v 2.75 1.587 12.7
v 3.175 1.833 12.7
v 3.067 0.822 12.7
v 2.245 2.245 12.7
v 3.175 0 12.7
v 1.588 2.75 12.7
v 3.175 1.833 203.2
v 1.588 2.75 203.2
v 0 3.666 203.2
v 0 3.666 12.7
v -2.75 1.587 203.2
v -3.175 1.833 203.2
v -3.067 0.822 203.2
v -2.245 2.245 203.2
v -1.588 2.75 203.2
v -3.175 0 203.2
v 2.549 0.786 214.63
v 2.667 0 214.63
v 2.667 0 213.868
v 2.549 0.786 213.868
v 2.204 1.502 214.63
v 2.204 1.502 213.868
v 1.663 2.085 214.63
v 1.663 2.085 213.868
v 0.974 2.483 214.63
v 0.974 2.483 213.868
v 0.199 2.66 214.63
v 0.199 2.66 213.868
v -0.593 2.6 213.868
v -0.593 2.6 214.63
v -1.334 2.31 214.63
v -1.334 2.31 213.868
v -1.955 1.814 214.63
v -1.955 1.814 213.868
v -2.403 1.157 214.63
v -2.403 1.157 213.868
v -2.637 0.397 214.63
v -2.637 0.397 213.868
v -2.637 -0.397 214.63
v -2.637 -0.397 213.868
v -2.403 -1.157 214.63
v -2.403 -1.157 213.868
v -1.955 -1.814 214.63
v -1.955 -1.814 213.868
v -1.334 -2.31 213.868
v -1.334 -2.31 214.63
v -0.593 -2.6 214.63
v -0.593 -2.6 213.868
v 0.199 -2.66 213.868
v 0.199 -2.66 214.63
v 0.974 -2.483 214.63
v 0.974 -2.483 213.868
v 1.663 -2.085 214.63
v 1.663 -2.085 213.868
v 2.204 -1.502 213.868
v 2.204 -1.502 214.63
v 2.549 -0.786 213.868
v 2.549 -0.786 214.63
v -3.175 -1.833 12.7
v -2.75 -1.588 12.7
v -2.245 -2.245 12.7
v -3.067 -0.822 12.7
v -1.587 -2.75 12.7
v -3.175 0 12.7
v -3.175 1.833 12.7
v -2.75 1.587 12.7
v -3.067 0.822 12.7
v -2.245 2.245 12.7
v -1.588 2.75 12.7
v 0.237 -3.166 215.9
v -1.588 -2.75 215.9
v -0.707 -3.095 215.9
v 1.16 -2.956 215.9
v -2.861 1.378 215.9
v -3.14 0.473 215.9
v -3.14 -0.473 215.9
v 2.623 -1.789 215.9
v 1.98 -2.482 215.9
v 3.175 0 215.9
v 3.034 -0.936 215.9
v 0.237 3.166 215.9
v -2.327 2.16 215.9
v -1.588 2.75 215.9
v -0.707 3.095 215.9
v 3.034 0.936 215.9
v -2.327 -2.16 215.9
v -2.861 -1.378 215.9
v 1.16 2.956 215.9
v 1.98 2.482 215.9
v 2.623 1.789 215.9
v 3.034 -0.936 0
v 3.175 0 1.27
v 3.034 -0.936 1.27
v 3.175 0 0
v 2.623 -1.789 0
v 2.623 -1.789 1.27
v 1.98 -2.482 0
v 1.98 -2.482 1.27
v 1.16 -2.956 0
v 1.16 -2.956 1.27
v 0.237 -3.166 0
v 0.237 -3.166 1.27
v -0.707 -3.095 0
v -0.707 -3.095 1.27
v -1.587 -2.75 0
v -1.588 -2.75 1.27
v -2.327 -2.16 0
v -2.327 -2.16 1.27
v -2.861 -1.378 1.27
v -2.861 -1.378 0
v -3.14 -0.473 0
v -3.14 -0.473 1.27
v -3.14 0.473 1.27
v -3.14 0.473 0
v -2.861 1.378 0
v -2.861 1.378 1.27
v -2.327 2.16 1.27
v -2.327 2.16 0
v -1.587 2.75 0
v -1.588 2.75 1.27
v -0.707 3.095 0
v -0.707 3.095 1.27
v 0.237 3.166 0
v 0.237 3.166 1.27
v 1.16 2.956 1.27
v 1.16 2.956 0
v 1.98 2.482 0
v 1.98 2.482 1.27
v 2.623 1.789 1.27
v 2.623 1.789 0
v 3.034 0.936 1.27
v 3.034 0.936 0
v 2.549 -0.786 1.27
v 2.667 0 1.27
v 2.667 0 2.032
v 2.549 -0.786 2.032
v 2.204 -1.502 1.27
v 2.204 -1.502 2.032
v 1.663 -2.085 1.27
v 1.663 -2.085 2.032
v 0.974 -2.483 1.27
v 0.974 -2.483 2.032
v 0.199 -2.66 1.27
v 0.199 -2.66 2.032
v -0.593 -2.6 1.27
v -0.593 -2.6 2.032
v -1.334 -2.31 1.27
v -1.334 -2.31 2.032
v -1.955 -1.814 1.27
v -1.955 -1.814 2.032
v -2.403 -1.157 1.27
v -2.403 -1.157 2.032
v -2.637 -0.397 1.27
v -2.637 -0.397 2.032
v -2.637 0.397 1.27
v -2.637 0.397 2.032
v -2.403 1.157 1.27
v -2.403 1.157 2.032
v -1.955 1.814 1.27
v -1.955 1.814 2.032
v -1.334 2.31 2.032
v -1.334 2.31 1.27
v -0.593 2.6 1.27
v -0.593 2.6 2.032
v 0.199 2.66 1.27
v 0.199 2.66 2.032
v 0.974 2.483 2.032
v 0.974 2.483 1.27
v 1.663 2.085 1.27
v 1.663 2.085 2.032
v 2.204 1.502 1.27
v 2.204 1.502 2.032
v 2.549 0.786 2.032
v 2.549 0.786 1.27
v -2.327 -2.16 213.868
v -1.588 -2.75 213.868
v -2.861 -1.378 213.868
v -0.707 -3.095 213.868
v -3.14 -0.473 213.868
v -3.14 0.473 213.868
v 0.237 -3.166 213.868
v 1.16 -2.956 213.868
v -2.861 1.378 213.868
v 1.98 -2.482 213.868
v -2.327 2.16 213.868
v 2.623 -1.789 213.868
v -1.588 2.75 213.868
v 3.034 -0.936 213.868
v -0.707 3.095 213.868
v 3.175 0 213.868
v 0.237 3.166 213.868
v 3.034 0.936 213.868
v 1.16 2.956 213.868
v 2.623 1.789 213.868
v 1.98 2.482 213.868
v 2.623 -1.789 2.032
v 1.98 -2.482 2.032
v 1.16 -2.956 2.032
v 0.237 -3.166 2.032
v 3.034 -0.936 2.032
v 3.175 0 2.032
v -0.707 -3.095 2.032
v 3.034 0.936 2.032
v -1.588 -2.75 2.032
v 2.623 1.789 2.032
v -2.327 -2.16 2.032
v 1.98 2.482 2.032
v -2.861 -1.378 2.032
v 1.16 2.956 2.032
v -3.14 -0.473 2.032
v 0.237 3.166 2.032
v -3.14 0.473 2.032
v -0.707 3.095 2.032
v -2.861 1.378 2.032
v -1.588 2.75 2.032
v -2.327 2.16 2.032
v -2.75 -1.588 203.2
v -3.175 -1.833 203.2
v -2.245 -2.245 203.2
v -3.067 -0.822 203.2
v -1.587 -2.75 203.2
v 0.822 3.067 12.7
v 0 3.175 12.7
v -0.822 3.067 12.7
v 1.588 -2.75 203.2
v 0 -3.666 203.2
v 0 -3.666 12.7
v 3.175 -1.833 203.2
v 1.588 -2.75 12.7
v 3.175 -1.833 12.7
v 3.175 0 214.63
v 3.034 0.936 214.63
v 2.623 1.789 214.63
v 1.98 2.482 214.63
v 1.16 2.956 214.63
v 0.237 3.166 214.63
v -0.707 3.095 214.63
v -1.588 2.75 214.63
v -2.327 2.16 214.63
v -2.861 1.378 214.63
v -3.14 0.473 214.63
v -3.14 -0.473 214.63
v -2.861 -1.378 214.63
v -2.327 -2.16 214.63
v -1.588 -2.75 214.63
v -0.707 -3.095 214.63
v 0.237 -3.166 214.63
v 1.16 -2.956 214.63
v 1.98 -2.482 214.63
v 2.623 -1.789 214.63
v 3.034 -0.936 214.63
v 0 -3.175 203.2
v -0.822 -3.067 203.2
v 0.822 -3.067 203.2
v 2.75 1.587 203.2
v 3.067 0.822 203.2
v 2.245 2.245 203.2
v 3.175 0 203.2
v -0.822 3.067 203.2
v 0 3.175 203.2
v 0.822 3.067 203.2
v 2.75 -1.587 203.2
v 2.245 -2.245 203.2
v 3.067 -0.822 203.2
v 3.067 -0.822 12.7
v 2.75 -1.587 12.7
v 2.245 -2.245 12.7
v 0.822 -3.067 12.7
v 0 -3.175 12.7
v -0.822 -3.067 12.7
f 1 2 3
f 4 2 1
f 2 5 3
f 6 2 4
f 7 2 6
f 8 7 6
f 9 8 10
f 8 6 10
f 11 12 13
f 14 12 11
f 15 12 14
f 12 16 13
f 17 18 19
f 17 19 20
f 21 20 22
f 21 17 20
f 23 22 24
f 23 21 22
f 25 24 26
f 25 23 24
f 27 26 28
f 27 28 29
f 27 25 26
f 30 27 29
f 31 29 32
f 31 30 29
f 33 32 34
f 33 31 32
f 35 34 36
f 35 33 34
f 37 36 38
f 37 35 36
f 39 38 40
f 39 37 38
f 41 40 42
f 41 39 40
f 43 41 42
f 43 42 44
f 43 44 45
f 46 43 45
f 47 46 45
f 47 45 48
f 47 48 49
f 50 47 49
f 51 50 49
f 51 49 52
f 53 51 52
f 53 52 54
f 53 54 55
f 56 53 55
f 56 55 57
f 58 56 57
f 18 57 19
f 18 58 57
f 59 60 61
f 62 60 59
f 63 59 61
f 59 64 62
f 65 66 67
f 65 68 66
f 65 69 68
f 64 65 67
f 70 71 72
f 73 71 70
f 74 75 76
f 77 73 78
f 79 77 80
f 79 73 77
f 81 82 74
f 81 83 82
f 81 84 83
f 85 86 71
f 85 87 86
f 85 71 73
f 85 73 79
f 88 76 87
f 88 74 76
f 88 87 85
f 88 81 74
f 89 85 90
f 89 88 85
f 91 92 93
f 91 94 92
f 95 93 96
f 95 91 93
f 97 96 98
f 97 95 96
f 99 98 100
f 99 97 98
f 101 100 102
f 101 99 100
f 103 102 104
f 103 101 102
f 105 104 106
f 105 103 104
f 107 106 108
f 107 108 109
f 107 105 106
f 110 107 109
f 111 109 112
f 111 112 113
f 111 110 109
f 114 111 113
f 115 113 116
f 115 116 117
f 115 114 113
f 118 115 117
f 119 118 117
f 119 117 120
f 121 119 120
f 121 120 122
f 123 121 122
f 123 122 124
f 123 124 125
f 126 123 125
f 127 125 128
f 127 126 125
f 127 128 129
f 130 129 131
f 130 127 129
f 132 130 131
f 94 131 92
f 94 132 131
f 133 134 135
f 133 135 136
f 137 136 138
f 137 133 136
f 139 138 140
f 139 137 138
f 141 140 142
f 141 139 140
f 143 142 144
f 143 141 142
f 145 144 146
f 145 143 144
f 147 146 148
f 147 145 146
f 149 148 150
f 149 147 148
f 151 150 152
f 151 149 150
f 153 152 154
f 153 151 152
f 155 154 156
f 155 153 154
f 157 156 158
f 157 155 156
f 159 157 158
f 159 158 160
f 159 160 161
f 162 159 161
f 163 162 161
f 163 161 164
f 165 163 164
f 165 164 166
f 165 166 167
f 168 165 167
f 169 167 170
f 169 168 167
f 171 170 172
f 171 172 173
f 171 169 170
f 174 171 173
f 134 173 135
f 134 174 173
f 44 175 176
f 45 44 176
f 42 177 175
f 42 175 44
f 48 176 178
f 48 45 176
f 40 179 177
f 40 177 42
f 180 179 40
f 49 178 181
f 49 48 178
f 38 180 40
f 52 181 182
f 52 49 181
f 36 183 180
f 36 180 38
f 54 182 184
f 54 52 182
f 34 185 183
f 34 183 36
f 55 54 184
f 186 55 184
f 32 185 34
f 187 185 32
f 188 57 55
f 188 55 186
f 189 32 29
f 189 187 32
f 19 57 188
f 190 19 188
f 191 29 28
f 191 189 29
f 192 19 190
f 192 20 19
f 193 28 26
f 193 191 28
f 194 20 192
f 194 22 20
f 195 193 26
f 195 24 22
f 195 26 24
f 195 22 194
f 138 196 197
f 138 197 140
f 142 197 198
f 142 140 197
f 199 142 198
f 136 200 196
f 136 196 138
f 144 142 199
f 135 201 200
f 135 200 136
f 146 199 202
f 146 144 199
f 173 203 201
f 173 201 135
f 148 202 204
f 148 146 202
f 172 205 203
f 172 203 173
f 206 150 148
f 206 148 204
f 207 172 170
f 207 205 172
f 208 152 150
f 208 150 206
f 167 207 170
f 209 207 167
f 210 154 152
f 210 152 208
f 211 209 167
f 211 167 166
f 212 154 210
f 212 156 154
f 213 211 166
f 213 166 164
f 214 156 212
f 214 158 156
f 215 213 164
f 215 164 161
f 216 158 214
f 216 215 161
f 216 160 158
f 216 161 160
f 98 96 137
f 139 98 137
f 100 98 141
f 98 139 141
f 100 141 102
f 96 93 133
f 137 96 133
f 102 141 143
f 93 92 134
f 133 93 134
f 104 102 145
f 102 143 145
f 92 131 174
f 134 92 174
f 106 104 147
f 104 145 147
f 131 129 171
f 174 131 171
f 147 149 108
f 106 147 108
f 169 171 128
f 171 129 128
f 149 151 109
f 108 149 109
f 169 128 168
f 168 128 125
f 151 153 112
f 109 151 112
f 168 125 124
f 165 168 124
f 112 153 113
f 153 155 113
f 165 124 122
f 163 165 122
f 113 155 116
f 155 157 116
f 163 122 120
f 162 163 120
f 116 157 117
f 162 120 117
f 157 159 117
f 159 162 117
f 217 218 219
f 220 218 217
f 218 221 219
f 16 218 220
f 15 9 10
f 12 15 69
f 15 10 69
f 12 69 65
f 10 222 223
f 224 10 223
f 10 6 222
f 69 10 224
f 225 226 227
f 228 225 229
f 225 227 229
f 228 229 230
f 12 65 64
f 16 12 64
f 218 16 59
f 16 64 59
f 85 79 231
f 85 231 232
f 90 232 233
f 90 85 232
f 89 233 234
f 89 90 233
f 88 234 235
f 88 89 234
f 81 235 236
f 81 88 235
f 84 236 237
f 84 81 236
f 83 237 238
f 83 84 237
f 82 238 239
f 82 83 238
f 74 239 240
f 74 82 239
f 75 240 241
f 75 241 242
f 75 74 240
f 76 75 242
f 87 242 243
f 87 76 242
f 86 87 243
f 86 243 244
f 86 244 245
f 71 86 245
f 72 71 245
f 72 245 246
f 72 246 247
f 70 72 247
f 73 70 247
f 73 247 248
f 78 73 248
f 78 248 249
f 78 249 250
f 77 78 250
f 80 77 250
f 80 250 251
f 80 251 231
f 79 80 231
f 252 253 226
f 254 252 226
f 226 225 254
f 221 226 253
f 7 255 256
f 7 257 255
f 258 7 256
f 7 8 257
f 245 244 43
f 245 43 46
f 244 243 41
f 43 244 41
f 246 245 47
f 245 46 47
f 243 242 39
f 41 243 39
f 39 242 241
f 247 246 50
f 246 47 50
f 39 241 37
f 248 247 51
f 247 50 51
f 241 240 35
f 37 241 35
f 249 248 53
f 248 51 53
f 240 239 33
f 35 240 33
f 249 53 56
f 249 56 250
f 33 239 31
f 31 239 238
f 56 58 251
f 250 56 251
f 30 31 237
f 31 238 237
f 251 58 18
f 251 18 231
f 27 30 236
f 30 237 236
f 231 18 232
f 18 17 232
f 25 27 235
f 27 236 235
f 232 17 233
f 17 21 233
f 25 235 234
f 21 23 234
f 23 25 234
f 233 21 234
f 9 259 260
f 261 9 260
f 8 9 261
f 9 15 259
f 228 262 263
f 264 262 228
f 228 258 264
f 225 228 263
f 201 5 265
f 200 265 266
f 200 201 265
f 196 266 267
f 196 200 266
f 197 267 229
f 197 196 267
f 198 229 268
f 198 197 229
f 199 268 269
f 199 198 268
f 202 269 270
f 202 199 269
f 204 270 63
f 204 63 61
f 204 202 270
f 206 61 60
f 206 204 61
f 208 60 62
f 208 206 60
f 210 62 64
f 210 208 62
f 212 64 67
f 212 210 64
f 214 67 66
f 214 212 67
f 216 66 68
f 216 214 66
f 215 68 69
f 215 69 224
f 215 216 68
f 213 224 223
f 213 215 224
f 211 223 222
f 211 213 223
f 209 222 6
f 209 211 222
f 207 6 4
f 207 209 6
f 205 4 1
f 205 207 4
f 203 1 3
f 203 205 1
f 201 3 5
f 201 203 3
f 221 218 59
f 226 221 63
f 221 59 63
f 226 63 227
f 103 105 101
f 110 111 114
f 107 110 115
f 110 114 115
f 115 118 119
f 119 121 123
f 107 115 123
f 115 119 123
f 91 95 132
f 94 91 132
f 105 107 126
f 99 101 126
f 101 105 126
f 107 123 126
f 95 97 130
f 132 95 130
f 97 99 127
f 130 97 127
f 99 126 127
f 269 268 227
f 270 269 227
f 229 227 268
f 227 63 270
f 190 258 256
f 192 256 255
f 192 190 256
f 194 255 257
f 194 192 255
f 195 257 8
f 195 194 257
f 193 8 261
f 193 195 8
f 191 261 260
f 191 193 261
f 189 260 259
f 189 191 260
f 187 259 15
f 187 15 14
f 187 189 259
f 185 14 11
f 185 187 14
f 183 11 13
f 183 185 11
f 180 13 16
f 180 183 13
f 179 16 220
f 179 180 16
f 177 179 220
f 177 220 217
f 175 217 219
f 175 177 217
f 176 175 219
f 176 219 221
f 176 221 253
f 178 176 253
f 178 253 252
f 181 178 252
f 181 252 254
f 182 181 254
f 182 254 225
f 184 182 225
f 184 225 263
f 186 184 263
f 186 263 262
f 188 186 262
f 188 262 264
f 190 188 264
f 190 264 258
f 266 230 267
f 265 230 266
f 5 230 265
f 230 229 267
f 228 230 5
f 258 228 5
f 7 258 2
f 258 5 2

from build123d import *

# Parameters (mm, degrees)
BOSS_EXTRUDE2_DEPTH = 215.9
SKETCH5_OUTSIDE_W   = 51.574
SKETCH5_OUTSIDE_H   = 52.556
SKETCH5_OUTSIDE_R   = 3.175
CUT_EXTRUDE1_DEPTH  = 12.7
SKETCH6_OUTSIDE_W   = 51.574
SKETCH6_OUTSIDE_H   = 52.556
SKETCH6_OUTSIDE_R   = 3.175
CUT_EXTRUDE2_DEPTH  = 12.7
SKETCH7_OUTSIDE_W   = 51.574
SKETCH7_OUTSIDE_H   = 52.556
SKETCH7_OUTSIDE_R   = 2.667
CUT_EXTRUDE3_DEPTH  = 0.762
SKETCH9_OUTSIDE_W   = 51.574
SKETCH9_OUTSIDE_H   = 52.556
SKETCH9_OUTSIDE_R   = 2.667
CUT_EXTRUDE4_DEPTH  = 0.762


with BuildPart() as part:
    # Sketch3 → Boss-Extrude2 (new body)
    with BuildSketch(Plane.XY):
        Polygon((0, 3.666174209), (-3.175, 1.833087105), (-3.175, -1.833087105), (0, -3.666174209), (3.175, -1.833087105), (3.175, 1.833087105), align=None)
    extrude(amount=BOSS_EXTRUDE2_DEPTH)

    # Sketch5 outside → Cut-Extrude1 (cut)
    with BuildSketch(Plane(origin=(0, 0, 0), x_dir=(-1, 0, 0), z_dir=(0, 0, -1))):
        Rectangle(SKETCH5_OUTSIDE_W, SKETCH5_OUTSIDE_H)
        with Locations(Location((0, 0, 0), (0, 0, 180))):
            Circle(SKETCH5_OUTSIDE_R, mode=Mode.SUBTRACT)
    extrude(amount=-CUT_EXTRUDE1_DEPTH, mode=Mode.SUBTRACT)

    # Sketch6 outside → Cut-Extrude2 (cut)
    with BuildSketch(Plane.XY.offset(215.9)):
        Rectangle(SKETCH6_OUTSIDE_W, SKETCH6_OUTSIDE_H)
        Circle(SKETCH6_OUTSIDE_R, mode=Mode.SUBTRACT)
    extrude(amount=-CUT_EXTRUDE2_DEPTH, mode=Mode.SUBTRACT)

    # Sketch7 outside → Cut-Extrude3 (cut)
    with BuildSketch(Plane.XY.offset(214.63)):
        Rectangle(SKETCH7_OUTSIDE_W, SKETCH7_OUTSIDE_H)
        Circle(SKETCH7_OUTSIDE_R, mode=Mode.SUBTRACT)
    extrude(amount=-CUT_EXTRUDE3_DEPTH, mode=Mode.SUBTRACT)

    # Sketch9 outside → Cut-Extrude4 (cut)
    with BuildSketch(Plane(origin=(0, 0, 1.27), x_dir=(-1, 0, 0), z_dir=(0, 0, -1))):
        Rectangle(SKETCH9_OUTSIDE_W, SKETCH9_OUTSIDE_H)
        with Locations(Location((0, 0, 0), (0, 0, 180))):
            Circle(SKETCH9_OUTSIDE_R, mode=Mode.SUBTRACT)
    extrude(amount=-CUT_EXTRUDE4_DEPTH, mode=Mode.SUBTRACT)


solid = part.part
